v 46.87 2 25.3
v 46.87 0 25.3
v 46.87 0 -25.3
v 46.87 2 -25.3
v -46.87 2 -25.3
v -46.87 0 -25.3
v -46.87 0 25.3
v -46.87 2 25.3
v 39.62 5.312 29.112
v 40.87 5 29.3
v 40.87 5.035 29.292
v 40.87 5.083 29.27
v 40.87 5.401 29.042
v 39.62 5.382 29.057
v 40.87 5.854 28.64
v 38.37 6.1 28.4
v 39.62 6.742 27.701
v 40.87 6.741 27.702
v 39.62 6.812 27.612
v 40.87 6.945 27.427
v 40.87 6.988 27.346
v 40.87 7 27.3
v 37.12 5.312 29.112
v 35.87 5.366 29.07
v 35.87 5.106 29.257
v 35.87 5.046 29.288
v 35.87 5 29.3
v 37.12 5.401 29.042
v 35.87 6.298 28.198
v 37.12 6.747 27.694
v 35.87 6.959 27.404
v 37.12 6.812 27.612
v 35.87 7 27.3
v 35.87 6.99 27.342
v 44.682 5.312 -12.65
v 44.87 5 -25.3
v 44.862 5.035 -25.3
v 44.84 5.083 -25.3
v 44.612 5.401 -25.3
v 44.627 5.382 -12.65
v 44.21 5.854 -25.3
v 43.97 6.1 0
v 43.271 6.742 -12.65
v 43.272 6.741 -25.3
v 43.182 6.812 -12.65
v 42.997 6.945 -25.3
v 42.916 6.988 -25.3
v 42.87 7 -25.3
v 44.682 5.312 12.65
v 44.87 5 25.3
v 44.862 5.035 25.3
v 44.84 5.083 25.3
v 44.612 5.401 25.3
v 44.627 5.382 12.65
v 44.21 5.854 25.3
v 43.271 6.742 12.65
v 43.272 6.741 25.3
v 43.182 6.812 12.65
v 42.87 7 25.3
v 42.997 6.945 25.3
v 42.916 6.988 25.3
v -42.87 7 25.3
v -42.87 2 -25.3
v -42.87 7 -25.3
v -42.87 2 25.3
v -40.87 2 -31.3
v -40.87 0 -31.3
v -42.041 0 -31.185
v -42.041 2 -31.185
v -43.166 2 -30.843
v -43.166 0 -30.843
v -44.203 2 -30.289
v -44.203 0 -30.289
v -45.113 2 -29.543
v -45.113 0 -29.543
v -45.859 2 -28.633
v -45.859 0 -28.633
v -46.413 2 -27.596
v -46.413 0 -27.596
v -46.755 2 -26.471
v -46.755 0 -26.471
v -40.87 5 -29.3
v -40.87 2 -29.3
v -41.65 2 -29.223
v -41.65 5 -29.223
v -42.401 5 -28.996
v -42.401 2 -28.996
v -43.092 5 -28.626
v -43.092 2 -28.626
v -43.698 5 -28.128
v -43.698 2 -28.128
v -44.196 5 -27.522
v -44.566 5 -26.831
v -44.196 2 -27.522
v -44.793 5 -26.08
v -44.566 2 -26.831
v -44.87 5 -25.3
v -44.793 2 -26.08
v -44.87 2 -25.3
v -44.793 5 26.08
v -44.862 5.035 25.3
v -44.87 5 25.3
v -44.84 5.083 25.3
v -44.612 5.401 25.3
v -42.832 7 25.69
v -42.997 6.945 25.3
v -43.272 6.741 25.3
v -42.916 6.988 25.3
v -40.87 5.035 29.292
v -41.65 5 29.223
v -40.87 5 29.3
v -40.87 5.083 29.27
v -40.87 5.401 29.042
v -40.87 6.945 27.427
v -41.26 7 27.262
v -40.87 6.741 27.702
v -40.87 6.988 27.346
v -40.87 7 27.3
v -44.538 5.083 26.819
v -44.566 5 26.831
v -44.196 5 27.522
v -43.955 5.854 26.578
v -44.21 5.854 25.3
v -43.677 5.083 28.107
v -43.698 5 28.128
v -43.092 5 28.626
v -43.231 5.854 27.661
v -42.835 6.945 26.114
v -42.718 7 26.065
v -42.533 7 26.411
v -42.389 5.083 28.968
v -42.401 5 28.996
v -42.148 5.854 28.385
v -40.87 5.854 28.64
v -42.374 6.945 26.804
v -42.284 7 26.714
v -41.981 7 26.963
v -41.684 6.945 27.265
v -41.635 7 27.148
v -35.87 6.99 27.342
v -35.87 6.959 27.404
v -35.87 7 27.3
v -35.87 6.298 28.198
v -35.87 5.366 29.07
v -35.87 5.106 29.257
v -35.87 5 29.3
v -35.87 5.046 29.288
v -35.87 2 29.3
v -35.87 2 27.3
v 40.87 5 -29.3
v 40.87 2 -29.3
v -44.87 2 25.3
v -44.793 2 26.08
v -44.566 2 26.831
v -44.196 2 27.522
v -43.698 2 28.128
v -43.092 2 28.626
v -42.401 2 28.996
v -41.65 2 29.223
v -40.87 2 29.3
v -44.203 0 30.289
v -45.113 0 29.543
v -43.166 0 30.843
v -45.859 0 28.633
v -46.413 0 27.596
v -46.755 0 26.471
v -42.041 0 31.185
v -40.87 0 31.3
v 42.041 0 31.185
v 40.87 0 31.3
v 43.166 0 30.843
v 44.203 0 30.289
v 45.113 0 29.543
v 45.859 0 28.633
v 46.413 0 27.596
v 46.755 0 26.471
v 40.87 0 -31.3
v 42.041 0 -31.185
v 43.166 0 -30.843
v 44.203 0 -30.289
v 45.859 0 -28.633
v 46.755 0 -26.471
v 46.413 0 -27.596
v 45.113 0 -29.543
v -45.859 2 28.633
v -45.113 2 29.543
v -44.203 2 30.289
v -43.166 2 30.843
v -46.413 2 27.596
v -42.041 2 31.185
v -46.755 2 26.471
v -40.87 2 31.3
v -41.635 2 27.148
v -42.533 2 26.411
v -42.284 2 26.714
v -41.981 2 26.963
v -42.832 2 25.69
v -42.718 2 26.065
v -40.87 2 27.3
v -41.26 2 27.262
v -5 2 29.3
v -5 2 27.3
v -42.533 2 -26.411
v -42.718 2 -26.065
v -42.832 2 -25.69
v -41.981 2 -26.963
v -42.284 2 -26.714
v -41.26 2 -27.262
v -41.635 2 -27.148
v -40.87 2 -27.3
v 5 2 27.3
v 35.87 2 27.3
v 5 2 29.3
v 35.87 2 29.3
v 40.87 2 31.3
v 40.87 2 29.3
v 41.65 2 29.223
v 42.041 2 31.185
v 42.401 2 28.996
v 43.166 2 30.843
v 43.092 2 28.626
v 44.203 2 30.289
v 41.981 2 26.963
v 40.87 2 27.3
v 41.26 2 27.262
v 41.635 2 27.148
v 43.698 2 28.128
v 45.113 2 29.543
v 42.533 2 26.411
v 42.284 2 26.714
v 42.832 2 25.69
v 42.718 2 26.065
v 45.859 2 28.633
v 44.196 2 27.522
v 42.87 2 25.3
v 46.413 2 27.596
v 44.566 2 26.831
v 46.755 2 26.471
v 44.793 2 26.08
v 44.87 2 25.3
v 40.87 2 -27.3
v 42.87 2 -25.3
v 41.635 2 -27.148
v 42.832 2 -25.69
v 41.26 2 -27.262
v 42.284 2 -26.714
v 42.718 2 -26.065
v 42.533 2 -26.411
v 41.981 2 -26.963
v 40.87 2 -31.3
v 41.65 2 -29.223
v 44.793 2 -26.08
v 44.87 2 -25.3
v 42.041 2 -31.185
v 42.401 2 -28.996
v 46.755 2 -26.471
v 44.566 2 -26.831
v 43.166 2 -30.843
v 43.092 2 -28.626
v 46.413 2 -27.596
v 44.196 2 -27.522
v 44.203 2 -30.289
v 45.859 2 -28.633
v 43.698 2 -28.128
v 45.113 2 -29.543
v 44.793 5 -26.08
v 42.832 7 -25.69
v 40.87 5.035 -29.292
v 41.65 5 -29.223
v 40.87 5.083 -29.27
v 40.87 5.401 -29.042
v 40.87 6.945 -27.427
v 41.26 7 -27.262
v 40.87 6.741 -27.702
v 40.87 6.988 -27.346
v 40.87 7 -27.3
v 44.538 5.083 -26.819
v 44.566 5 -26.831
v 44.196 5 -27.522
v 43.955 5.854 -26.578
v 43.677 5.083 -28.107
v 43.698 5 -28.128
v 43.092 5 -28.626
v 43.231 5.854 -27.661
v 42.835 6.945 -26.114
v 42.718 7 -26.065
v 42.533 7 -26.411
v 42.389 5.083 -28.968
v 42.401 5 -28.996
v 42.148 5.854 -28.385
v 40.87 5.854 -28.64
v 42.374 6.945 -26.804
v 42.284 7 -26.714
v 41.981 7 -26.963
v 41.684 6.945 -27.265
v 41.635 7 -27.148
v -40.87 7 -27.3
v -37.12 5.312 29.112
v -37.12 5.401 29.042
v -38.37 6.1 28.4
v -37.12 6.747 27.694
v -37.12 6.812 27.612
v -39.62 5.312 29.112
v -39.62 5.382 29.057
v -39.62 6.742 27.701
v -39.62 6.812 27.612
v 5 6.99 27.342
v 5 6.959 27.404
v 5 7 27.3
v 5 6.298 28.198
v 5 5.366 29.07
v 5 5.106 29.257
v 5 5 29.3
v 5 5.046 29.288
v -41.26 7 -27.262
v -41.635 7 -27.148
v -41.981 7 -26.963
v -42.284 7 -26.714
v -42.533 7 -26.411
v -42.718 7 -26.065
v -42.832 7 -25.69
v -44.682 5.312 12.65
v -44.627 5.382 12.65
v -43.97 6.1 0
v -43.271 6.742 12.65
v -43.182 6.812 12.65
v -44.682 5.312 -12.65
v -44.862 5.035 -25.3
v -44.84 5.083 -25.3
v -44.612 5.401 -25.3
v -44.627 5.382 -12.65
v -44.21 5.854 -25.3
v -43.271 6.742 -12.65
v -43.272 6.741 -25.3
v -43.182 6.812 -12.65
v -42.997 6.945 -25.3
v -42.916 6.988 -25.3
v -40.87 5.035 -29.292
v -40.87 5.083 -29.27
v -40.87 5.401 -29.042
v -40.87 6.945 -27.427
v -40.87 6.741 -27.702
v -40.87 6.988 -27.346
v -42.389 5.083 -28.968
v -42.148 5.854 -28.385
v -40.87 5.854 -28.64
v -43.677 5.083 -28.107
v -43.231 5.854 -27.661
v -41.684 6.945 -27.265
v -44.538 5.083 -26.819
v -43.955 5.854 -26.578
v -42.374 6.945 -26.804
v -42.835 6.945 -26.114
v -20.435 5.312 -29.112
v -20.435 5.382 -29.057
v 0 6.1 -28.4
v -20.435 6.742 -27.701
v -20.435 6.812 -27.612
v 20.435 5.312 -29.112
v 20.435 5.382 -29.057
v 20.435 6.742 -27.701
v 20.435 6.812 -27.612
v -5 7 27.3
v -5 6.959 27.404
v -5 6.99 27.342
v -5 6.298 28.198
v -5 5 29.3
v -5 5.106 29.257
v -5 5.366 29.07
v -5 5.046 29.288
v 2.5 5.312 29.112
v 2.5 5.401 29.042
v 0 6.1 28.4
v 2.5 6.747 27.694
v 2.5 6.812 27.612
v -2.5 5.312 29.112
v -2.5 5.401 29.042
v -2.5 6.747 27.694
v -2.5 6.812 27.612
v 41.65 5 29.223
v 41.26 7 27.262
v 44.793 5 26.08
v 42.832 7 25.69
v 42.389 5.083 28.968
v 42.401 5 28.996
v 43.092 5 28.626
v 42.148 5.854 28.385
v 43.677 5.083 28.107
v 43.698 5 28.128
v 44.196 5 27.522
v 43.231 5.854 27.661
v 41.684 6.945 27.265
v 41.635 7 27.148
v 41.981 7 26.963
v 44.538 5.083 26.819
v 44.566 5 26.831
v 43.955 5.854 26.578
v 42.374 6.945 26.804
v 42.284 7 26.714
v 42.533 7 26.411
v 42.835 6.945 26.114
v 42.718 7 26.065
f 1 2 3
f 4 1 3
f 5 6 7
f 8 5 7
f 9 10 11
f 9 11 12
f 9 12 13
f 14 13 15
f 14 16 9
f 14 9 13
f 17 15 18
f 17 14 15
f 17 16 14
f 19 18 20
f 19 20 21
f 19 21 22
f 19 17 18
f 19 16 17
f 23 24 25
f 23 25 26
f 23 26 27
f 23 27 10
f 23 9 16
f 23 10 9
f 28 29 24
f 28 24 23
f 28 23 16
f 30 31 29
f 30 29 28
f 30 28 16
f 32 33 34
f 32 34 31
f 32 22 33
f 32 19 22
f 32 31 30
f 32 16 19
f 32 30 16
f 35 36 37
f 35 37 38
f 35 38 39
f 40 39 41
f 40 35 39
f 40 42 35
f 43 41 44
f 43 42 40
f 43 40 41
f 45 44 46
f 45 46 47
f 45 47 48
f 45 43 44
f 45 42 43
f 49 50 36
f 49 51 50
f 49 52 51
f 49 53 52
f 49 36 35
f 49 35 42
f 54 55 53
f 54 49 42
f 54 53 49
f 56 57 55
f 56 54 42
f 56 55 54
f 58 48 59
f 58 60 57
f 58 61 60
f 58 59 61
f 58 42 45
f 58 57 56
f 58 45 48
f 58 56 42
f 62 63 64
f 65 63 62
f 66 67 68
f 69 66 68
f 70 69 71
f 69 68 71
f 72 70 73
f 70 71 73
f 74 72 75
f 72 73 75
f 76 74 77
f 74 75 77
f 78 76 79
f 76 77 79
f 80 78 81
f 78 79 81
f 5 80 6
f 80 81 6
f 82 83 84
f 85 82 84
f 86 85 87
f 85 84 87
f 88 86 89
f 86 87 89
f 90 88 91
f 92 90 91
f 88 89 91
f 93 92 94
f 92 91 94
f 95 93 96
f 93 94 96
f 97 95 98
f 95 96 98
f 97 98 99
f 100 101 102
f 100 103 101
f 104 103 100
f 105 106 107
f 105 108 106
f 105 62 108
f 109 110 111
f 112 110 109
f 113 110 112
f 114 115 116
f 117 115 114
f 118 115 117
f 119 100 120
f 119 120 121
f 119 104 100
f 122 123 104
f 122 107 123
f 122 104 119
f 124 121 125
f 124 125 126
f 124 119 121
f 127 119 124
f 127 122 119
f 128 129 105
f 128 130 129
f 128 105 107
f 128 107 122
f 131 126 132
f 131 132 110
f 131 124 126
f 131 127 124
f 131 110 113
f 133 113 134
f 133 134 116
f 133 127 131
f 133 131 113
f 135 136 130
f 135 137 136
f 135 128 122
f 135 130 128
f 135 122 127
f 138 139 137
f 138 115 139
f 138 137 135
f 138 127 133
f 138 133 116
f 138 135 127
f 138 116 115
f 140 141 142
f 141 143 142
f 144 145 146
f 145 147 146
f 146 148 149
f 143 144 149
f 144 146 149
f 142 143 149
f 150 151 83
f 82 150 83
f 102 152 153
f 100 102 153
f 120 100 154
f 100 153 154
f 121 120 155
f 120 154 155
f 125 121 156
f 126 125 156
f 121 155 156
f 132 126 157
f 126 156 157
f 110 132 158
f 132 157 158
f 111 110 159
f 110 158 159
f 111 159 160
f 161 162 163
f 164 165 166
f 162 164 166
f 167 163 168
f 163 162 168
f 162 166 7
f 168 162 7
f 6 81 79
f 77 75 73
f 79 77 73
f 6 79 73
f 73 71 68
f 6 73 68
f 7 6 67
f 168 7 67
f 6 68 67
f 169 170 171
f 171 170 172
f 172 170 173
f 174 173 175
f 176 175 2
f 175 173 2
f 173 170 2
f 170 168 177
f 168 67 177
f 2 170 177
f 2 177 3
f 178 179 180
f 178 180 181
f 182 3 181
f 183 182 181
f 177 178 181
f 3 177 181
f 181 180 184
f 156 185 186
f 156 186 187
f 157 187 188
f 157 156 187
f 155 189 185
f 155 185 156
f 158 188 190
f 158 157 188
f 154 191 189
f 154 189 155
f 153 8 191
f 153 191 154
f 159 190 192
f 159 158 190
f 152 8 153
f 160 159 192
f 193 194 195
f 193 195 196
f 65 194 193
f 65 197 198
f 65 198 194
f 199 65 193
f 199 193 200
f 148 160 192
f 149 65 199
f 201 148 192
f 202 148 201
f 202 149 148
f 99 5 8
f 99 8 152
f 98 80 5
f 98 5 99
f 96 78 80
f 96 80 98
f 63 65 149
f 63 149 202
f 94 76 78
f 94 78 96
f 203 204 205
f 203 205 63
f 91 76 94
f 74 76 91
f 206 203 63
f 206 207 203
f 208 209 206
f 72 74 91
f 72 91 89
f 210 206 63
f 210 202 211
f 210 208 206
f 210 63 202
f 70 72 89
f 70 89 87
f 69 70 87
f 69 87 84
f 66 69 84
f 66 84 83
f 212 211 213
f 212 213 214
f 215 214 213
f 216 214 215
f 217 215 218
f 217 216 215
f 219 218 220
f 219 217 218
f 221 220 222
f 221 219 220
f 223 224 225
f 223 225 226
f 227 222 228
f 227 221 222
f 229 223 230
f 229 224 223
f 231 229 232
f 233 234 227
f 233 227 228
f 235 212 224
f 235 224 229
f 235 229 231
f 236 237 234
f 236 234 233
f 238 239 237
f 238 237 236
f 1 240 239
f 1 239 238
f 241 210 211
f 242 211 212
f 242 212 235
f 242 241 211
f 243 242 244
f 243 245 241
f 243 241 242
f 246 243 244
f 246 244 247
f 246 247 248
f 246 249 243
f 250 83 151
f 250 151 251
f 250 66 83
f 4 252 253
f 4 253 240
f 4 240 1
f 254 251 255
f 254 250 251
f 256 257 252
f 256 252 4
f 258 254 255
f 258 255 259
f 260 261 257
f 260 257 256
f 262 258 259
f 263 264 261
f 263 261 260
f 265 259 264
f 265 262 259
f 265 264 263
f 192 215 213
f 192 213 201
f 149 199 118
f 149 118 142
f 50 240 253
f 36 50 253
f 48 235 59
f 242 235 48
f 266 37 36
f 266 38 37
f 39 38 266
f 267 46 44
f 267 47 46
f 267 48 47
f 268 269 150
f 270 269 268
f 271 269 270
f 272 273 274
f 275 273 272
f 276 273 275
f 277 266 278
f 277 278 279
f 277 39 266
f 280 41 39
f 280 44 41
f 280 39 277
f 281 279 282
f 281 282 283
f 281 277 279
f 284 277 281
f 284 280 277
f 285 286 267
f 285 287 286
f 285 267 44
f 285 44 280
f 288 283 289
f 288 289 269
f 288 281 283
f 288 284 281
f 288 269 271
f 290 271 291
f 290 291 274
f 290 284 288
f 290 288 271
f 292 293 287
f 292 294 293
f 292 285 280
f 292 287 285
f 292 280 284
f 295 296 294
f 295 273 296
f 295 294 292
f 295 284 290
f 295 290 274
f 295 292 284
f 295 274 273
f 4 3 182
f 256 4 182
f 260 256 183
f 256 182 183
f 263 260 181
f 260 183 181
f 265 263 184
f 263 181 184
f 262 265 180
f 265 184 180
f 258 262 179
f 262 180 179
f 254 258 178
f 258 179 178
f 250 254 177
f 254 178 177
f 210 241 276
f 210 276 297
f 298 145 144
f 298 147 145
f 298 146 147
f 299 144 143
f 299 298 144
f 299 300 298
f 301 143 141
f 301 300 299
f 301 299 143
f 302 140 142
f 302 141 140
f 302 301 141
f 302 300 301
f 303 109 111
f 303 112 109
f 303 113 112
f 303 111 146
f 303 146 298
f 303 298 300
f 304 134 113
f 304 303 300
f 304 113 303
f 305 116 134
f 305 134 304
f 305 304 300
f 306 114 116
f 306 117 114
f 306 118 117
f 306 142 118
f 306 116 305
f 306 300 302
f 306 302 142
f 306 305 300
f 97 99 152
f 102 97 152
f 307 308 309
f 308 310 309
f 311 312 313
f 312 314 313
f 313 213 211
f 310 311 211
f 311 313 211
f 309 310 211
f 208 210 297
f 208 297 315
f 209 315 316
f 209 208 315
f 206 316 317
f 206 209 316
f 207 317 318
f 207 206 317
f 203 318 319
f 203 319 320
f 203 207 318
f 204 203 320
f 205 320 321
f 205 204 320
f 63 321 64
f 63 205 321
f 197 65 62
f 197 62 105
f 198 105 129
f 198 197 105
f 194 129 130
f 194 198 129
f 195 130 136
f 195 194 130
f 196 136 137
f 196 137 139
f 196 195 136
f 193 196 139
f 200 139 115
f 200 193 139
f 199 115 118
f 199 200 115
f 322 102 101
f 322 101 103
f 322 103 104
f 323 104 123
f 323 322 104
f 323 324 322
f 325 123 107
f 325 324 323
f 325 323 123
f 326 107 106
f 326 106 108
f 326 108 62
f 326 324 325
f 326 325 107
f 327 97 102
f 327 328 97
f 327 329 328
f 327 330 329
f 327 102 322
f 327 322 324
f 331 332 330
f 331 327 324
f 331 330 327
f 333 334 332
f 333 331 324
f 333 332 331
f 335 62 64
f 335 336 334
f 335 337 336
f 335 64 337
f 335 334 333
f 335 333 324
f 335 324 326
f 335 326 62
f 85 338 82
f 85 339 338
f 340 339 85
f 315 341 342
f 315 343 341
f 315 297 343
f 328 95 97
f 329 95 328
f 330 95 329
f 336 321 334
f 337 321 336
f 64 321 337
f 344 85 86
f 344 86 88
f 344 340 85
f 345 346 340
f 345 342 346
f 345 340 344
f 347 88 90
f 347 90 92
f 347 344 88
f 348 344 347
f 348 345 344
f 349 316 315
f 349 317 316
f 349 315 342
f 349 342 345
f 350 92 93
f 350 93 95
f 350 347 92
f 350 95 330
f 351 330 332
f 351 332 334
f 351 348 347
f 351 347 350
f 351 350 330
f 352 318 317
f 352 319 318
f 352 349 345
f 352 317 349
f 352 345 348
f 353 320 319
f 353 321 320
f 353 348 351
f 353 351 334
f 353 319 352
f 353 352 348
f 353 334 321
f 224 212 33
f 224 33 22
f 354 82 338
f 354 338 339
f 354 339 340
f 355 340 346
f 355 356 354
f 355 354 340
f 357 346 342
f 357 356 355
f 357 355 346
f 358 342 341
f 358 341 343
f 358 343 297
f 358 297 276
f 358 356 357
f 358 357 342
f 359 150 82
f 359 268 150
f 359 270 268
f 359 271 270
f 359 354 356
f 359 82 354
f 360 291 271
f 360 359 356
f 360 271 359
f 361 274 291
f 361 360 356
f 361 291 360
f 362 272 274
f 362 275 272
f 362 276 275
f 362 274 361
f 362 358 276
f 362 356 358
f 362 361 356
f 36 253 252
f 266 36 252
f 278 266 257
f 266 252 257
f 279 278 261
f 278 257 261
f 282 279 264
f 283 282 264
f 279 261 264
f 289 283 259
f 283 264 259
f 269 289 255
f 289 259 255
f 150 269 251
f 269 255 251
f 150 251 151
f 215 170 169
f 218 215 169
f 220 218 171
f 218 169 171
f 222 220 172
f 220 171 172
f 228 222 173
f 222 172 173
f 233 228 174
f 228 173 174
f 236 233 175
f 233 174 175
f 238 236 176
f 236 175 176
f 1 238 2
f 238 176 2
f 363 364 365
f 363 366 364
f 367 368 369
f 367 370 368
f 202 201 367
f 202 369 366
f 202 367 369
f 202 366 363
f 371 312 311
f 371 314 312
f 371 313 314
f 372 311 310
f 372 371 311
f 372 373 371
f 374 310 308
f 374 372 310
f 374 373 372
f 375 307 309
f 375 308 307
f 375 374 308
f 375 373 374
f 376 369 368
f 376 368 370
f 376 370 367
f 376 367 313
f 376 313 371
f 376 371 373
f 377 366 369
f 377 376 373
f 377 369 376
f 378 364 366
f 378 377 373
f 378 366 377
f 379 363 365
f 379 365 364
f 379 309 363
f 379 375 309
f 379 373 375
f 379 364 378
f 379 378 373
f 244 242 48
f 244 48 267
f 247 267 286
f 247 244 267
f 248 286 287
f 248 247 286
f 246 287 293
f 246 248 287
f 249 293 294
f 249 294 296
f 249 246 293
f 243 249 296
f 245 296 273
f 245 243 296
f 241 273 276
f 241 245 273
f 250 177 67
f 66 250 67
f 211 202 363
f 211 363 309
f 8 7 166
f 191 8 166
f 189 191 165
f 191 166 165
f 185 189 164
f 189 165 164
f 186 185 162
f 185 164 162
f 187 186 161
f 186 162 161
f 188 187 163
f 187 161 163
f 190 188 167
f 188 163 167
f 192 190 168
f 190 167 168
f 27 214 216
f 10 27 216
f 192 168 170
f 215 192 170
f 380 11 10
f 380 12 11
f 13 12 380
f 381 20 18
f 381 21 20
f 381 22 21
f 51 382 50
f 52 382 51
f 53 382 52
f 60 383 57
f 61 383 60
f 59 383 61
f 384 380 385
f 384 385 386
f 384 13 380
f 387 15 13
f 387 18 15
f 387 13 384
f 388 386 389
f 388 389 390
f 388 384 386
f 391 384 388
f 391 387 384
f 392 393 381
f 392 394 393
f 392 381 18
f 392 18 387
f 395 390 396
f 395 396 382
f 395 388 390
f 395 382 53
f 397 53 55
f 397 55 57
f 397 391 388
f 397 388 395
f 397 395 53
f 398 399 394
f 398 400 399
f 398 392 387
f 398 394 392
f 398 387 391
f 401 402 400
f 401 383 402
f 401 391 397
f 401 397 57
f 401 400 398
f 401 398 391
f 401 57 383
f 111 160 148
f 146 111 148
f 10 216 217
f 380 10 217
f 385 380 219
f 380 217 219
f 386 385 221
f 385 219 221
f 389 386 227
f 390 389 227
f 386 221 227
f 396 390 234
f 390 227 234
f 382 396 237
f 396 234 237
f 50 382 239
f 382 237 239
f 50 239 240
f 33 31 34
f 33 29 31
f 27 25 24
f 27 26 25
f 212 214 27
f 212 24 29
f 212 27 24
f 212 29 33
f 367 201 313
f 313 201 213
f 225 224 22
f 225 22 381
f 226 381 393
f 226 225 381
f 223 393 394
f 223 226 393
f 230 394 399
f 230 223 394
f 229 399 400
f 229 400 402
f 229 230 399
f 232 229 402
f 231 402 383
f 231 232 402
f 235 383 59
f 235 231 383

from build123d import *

# Parameters (mm, degrees)
SALIENTE_EXTRUIR1_DEPTH = 2
SALIENTE_EXTRUIR2_DEPTH = 5
REDONDEO1_SIZE          = 2
CROQUIS3_W              = 30.87
CROQUIS3_H              = 2
CORTAR_EXTRUIR1_DEPTH   = 8


with BuildPart() as part:
    # Croquis1 → Saliente-Extruir1 (new body)
    with BuildSketch(Plane(origin=(0, 0, 0), x_dir=(1, 0, 0), z_dir=(0, 1, 0))):
        with BuildLine():
            Line((-40.87, -31.3), (40.87, -31.3))
            ThreePointArc((40.87, -31.3), (45.112640687, -29.542640687), (46.87, -25.3))
            Line((46.87, -25.3), (46.87, 25.3))
            ThreePointArc((46.87, 25.3), (45.112640687, 29.542640687), (40.87, 31.3))
            Line((40.87, 31.3), (-40.87, 31.3))
            ThreePointArc((-40.87, 31.3), (-45.112640687, 29.542640687), (-46.87, 25.3))
            Line((-46.87, 25.3), (-46.87, -25.3))
            ThreePointArc((-46.87, -25.3), (-45.112640687, -29.542640687), (-40.87, -31.3))
        make_face()
    extrude(amount=SALIENTE_EXTRUIR1_DEPTH)

    # Croquis2 → Saliente-Extruir2 (add)
    with BuildSketch(Plane(origin=(0, 2, 0), x_dir=(1, 0, 0), z_dir=(0, 1, 0))):
        with BuildLine():
            Line((44.87, -25.3), (44.87, 25.3))
            ThreePointArc((44.87, 25.3), (43.698427125, 28.128427125), (40.87, 29.3))
            Line((40.87, 29.3), (-40.87, 29.3))
            ThreePointArc((-40.87, 29.3), (-43.698427125, 28.128427125), (-44.87, 25.3))
            Line((-44.87, 25.3), (-44.87, -25.3))
            ThreePointArc((-44.87, -25.3), (-43.698427125, -28.128427125), (-40.87, -29.3))
            Line((-40.87, -29.3), (40.87, -29.3))
            ThreePointArc((40.87, -29.3), (43.698427125, -28.128427125), (44.87, -25.3))
        make_face()
        with BuildLine():
            Line((42.87, -25.3), (42.87, 25.3))
            ThreePointArc((42.87, 25.3), (42.284213562, 26.714213562), (40.87, 27.3))
            Line((40.87, 27.3), (-40.87, 27.3))
            ThreePointArc((-40.87, 27.3), (-42.284213562, 26.714213562), (-42.87, 25.3))
            Line((-42.87, 25.3), (-42.87, -25.3))
            ThreePointArc((-42.87, -25.3), (-42.284213562, -26.714213562), (-40.87, -27.3))
            Line((-40.87, -27.3), (40.87, -27.3))
            ThreePointArc((40.87, -27.3), (42.284213562, -26.714213562), (42.87, -25.3))
        make_face(mode=Mode.SUBTRACT)
    extrude(amount=SALIENTE_EXTRUIR2_DEPTH)

    # Redondeo1
    # a fillet whose section is not a circle: 2 mm, written as the material it takes off along each edge
    with BuildSketch(Plane(origin=(40.87, 7, -29.3), x_dir=(0, -1, 0), z_dir=(-1, 0, 0)), Plane(origin=(-40.87, 7, 29.3), x_dir=(0, -1, 0), z_dir=(1, 0, 0))) as redondeo1_piece_1:
        with BuildLine():
            Bezier((REDONDEO1_SIZE, 0), (0, 0), (0, REDONDEO1_SIZE), weights=[1, 0.111111111, 1])
            Line((0, REDONDEO1_SIZE), (0, 0))
            Line((0, 0), (REDONDEO1_SIZE, 0))
        make_face()
    extrude(amount=81.74, mode=Mode.SUBTRACT)
    with BuildSketch(Plane(origin=(-40.87, 7, -25.3), x_dir=(0, 0, -1), z_dir=(1, 0, 0))) as redondeo1_piece_2:
        with BuildLine():
            Bezier((4, -REDONDEO1_SIZE), (4, 0), (4 - REDONDEO1_SIZE, 0), weights=[1, 0.111111111, 1])
            Line((4 - REDONDEO1_SIZE, 0), (4, 0))
            Line((4, 0), (4, -REDONDEO1_SIZE))
        make_face()
    revolve(axis=Axis((-40.87, 7, -25.3), (0, 1, 0)), revolution_arc=90, mode=Mode.SUBTRACT)
    with BuildSketch(Plane(origin=(40.87, 7, -25.3), x_dir=(1, 0, 0), z_dir=(0, 0, 1))) as redondeo1_piece_3:
        with BuildLine():
            Bezier((4, -REDONDEO1_SIZE), (4, 0), (4 - REDONDEO1_SIZE, 0), weights=[1, 0.111111111, 1])
            Line((4 - REDONDEO1_SIZE, 0), (4, 0))
            Line((4, 0), (4, -REDONDEO1_SIZE))
        make_face()
    revolve(axis=Axis((40.87, 7, -25.3), (0, 1, 0)), revolution_arc=90, mode=Mode.SUBTRACT)
    with BuildSketch(Plane(origin=(-44.87, 7, -25.3), x_dir=(0, -1, 0), z_dir=(0, 0, 1)), Plane(origin=(44.87, 7, 25.3), x_dir=(0, -1, 0), z_dir=(0, 0, -1))) as redondeo1_piece_4:
        with BuildLine():
            Bezier((REDONDEO1_SIZE, 0), (0, 0), (0, REDONDEO1_SIZE), weights=[1, 0.111111111, 1])
            Line((0, REDONDEO1_SIZE), (0, 0))
            Line((0, 0), (REDONDEO1_SIZE, 0))
        make_face()
    extrude(amount=50.6, mode=Mode.SUBTRACT)
    with BuildSketch(Plane(origin=(-40.87, 7, 25.3), x_dir=(-1, 0, 0), z_dir=(0, 0, -1))) as redondeo1_piece_5:
        with BuildLine():
            Bezier((4, -REDONDEO1_SIZE), (4, 0), (4 - REDONDEO1_SIZE, 0), weights=[1, 0.111111111, 1])
            Line((4 - REDONDEO1_SIZE, 0), (4, 0))
            Line((4, 0), (4, -REDONDEO1_SIZE))
        make_face()
    revolve(axis=Axis((-40.87, 7, 25.3), (0, 1, 0)), revolution_arc=90, mode=Mode.SUBTRACT)
    with BuildSketch(Plane(origin=(40.87, 7, 25.3), x_dir=(0, 0, 1), z_dir=(-1, 0, 0))) as redondeo1_piece_6:
        with BuildLine():
            Bezier((4, -REDONDEO1_SIZE), (4, 0), (4 - REDONDEO1_SIZE, 0), weights=[1, 0.111111111, 1])
            Line((4 - REDONDEO1_SIZE, 0), (4, 0))
            Line((4, 0), (4, -REDONDEO1_SIZE))
        make_face()
    revolve(axis=Axis((40.87, 7, 25.3), (0, 1, 0)), revolution_arc=90, mode=Mode.SUBTRACT)

    # Croquis3 → Cortar-Extruir1 (cut)
    with BuildSketch(Plane(origin=(0, 2, 0), x_dir=(1, 0, 0), z_dir=(0, 1, 0))):
        with Locations((-20.435, -28.3)):
            Rectangle(CROQUIS3_W, CROQUIS3_H)
        with Locations((20.435, -28.3)):
            Rectangle(CROQUIS3_W, CROQUIS3_H)
    extrude(amount=CORTAR_EXTRUIR1_DEPTH, mode=Mode.SUBTRACT)


solid = part.part
